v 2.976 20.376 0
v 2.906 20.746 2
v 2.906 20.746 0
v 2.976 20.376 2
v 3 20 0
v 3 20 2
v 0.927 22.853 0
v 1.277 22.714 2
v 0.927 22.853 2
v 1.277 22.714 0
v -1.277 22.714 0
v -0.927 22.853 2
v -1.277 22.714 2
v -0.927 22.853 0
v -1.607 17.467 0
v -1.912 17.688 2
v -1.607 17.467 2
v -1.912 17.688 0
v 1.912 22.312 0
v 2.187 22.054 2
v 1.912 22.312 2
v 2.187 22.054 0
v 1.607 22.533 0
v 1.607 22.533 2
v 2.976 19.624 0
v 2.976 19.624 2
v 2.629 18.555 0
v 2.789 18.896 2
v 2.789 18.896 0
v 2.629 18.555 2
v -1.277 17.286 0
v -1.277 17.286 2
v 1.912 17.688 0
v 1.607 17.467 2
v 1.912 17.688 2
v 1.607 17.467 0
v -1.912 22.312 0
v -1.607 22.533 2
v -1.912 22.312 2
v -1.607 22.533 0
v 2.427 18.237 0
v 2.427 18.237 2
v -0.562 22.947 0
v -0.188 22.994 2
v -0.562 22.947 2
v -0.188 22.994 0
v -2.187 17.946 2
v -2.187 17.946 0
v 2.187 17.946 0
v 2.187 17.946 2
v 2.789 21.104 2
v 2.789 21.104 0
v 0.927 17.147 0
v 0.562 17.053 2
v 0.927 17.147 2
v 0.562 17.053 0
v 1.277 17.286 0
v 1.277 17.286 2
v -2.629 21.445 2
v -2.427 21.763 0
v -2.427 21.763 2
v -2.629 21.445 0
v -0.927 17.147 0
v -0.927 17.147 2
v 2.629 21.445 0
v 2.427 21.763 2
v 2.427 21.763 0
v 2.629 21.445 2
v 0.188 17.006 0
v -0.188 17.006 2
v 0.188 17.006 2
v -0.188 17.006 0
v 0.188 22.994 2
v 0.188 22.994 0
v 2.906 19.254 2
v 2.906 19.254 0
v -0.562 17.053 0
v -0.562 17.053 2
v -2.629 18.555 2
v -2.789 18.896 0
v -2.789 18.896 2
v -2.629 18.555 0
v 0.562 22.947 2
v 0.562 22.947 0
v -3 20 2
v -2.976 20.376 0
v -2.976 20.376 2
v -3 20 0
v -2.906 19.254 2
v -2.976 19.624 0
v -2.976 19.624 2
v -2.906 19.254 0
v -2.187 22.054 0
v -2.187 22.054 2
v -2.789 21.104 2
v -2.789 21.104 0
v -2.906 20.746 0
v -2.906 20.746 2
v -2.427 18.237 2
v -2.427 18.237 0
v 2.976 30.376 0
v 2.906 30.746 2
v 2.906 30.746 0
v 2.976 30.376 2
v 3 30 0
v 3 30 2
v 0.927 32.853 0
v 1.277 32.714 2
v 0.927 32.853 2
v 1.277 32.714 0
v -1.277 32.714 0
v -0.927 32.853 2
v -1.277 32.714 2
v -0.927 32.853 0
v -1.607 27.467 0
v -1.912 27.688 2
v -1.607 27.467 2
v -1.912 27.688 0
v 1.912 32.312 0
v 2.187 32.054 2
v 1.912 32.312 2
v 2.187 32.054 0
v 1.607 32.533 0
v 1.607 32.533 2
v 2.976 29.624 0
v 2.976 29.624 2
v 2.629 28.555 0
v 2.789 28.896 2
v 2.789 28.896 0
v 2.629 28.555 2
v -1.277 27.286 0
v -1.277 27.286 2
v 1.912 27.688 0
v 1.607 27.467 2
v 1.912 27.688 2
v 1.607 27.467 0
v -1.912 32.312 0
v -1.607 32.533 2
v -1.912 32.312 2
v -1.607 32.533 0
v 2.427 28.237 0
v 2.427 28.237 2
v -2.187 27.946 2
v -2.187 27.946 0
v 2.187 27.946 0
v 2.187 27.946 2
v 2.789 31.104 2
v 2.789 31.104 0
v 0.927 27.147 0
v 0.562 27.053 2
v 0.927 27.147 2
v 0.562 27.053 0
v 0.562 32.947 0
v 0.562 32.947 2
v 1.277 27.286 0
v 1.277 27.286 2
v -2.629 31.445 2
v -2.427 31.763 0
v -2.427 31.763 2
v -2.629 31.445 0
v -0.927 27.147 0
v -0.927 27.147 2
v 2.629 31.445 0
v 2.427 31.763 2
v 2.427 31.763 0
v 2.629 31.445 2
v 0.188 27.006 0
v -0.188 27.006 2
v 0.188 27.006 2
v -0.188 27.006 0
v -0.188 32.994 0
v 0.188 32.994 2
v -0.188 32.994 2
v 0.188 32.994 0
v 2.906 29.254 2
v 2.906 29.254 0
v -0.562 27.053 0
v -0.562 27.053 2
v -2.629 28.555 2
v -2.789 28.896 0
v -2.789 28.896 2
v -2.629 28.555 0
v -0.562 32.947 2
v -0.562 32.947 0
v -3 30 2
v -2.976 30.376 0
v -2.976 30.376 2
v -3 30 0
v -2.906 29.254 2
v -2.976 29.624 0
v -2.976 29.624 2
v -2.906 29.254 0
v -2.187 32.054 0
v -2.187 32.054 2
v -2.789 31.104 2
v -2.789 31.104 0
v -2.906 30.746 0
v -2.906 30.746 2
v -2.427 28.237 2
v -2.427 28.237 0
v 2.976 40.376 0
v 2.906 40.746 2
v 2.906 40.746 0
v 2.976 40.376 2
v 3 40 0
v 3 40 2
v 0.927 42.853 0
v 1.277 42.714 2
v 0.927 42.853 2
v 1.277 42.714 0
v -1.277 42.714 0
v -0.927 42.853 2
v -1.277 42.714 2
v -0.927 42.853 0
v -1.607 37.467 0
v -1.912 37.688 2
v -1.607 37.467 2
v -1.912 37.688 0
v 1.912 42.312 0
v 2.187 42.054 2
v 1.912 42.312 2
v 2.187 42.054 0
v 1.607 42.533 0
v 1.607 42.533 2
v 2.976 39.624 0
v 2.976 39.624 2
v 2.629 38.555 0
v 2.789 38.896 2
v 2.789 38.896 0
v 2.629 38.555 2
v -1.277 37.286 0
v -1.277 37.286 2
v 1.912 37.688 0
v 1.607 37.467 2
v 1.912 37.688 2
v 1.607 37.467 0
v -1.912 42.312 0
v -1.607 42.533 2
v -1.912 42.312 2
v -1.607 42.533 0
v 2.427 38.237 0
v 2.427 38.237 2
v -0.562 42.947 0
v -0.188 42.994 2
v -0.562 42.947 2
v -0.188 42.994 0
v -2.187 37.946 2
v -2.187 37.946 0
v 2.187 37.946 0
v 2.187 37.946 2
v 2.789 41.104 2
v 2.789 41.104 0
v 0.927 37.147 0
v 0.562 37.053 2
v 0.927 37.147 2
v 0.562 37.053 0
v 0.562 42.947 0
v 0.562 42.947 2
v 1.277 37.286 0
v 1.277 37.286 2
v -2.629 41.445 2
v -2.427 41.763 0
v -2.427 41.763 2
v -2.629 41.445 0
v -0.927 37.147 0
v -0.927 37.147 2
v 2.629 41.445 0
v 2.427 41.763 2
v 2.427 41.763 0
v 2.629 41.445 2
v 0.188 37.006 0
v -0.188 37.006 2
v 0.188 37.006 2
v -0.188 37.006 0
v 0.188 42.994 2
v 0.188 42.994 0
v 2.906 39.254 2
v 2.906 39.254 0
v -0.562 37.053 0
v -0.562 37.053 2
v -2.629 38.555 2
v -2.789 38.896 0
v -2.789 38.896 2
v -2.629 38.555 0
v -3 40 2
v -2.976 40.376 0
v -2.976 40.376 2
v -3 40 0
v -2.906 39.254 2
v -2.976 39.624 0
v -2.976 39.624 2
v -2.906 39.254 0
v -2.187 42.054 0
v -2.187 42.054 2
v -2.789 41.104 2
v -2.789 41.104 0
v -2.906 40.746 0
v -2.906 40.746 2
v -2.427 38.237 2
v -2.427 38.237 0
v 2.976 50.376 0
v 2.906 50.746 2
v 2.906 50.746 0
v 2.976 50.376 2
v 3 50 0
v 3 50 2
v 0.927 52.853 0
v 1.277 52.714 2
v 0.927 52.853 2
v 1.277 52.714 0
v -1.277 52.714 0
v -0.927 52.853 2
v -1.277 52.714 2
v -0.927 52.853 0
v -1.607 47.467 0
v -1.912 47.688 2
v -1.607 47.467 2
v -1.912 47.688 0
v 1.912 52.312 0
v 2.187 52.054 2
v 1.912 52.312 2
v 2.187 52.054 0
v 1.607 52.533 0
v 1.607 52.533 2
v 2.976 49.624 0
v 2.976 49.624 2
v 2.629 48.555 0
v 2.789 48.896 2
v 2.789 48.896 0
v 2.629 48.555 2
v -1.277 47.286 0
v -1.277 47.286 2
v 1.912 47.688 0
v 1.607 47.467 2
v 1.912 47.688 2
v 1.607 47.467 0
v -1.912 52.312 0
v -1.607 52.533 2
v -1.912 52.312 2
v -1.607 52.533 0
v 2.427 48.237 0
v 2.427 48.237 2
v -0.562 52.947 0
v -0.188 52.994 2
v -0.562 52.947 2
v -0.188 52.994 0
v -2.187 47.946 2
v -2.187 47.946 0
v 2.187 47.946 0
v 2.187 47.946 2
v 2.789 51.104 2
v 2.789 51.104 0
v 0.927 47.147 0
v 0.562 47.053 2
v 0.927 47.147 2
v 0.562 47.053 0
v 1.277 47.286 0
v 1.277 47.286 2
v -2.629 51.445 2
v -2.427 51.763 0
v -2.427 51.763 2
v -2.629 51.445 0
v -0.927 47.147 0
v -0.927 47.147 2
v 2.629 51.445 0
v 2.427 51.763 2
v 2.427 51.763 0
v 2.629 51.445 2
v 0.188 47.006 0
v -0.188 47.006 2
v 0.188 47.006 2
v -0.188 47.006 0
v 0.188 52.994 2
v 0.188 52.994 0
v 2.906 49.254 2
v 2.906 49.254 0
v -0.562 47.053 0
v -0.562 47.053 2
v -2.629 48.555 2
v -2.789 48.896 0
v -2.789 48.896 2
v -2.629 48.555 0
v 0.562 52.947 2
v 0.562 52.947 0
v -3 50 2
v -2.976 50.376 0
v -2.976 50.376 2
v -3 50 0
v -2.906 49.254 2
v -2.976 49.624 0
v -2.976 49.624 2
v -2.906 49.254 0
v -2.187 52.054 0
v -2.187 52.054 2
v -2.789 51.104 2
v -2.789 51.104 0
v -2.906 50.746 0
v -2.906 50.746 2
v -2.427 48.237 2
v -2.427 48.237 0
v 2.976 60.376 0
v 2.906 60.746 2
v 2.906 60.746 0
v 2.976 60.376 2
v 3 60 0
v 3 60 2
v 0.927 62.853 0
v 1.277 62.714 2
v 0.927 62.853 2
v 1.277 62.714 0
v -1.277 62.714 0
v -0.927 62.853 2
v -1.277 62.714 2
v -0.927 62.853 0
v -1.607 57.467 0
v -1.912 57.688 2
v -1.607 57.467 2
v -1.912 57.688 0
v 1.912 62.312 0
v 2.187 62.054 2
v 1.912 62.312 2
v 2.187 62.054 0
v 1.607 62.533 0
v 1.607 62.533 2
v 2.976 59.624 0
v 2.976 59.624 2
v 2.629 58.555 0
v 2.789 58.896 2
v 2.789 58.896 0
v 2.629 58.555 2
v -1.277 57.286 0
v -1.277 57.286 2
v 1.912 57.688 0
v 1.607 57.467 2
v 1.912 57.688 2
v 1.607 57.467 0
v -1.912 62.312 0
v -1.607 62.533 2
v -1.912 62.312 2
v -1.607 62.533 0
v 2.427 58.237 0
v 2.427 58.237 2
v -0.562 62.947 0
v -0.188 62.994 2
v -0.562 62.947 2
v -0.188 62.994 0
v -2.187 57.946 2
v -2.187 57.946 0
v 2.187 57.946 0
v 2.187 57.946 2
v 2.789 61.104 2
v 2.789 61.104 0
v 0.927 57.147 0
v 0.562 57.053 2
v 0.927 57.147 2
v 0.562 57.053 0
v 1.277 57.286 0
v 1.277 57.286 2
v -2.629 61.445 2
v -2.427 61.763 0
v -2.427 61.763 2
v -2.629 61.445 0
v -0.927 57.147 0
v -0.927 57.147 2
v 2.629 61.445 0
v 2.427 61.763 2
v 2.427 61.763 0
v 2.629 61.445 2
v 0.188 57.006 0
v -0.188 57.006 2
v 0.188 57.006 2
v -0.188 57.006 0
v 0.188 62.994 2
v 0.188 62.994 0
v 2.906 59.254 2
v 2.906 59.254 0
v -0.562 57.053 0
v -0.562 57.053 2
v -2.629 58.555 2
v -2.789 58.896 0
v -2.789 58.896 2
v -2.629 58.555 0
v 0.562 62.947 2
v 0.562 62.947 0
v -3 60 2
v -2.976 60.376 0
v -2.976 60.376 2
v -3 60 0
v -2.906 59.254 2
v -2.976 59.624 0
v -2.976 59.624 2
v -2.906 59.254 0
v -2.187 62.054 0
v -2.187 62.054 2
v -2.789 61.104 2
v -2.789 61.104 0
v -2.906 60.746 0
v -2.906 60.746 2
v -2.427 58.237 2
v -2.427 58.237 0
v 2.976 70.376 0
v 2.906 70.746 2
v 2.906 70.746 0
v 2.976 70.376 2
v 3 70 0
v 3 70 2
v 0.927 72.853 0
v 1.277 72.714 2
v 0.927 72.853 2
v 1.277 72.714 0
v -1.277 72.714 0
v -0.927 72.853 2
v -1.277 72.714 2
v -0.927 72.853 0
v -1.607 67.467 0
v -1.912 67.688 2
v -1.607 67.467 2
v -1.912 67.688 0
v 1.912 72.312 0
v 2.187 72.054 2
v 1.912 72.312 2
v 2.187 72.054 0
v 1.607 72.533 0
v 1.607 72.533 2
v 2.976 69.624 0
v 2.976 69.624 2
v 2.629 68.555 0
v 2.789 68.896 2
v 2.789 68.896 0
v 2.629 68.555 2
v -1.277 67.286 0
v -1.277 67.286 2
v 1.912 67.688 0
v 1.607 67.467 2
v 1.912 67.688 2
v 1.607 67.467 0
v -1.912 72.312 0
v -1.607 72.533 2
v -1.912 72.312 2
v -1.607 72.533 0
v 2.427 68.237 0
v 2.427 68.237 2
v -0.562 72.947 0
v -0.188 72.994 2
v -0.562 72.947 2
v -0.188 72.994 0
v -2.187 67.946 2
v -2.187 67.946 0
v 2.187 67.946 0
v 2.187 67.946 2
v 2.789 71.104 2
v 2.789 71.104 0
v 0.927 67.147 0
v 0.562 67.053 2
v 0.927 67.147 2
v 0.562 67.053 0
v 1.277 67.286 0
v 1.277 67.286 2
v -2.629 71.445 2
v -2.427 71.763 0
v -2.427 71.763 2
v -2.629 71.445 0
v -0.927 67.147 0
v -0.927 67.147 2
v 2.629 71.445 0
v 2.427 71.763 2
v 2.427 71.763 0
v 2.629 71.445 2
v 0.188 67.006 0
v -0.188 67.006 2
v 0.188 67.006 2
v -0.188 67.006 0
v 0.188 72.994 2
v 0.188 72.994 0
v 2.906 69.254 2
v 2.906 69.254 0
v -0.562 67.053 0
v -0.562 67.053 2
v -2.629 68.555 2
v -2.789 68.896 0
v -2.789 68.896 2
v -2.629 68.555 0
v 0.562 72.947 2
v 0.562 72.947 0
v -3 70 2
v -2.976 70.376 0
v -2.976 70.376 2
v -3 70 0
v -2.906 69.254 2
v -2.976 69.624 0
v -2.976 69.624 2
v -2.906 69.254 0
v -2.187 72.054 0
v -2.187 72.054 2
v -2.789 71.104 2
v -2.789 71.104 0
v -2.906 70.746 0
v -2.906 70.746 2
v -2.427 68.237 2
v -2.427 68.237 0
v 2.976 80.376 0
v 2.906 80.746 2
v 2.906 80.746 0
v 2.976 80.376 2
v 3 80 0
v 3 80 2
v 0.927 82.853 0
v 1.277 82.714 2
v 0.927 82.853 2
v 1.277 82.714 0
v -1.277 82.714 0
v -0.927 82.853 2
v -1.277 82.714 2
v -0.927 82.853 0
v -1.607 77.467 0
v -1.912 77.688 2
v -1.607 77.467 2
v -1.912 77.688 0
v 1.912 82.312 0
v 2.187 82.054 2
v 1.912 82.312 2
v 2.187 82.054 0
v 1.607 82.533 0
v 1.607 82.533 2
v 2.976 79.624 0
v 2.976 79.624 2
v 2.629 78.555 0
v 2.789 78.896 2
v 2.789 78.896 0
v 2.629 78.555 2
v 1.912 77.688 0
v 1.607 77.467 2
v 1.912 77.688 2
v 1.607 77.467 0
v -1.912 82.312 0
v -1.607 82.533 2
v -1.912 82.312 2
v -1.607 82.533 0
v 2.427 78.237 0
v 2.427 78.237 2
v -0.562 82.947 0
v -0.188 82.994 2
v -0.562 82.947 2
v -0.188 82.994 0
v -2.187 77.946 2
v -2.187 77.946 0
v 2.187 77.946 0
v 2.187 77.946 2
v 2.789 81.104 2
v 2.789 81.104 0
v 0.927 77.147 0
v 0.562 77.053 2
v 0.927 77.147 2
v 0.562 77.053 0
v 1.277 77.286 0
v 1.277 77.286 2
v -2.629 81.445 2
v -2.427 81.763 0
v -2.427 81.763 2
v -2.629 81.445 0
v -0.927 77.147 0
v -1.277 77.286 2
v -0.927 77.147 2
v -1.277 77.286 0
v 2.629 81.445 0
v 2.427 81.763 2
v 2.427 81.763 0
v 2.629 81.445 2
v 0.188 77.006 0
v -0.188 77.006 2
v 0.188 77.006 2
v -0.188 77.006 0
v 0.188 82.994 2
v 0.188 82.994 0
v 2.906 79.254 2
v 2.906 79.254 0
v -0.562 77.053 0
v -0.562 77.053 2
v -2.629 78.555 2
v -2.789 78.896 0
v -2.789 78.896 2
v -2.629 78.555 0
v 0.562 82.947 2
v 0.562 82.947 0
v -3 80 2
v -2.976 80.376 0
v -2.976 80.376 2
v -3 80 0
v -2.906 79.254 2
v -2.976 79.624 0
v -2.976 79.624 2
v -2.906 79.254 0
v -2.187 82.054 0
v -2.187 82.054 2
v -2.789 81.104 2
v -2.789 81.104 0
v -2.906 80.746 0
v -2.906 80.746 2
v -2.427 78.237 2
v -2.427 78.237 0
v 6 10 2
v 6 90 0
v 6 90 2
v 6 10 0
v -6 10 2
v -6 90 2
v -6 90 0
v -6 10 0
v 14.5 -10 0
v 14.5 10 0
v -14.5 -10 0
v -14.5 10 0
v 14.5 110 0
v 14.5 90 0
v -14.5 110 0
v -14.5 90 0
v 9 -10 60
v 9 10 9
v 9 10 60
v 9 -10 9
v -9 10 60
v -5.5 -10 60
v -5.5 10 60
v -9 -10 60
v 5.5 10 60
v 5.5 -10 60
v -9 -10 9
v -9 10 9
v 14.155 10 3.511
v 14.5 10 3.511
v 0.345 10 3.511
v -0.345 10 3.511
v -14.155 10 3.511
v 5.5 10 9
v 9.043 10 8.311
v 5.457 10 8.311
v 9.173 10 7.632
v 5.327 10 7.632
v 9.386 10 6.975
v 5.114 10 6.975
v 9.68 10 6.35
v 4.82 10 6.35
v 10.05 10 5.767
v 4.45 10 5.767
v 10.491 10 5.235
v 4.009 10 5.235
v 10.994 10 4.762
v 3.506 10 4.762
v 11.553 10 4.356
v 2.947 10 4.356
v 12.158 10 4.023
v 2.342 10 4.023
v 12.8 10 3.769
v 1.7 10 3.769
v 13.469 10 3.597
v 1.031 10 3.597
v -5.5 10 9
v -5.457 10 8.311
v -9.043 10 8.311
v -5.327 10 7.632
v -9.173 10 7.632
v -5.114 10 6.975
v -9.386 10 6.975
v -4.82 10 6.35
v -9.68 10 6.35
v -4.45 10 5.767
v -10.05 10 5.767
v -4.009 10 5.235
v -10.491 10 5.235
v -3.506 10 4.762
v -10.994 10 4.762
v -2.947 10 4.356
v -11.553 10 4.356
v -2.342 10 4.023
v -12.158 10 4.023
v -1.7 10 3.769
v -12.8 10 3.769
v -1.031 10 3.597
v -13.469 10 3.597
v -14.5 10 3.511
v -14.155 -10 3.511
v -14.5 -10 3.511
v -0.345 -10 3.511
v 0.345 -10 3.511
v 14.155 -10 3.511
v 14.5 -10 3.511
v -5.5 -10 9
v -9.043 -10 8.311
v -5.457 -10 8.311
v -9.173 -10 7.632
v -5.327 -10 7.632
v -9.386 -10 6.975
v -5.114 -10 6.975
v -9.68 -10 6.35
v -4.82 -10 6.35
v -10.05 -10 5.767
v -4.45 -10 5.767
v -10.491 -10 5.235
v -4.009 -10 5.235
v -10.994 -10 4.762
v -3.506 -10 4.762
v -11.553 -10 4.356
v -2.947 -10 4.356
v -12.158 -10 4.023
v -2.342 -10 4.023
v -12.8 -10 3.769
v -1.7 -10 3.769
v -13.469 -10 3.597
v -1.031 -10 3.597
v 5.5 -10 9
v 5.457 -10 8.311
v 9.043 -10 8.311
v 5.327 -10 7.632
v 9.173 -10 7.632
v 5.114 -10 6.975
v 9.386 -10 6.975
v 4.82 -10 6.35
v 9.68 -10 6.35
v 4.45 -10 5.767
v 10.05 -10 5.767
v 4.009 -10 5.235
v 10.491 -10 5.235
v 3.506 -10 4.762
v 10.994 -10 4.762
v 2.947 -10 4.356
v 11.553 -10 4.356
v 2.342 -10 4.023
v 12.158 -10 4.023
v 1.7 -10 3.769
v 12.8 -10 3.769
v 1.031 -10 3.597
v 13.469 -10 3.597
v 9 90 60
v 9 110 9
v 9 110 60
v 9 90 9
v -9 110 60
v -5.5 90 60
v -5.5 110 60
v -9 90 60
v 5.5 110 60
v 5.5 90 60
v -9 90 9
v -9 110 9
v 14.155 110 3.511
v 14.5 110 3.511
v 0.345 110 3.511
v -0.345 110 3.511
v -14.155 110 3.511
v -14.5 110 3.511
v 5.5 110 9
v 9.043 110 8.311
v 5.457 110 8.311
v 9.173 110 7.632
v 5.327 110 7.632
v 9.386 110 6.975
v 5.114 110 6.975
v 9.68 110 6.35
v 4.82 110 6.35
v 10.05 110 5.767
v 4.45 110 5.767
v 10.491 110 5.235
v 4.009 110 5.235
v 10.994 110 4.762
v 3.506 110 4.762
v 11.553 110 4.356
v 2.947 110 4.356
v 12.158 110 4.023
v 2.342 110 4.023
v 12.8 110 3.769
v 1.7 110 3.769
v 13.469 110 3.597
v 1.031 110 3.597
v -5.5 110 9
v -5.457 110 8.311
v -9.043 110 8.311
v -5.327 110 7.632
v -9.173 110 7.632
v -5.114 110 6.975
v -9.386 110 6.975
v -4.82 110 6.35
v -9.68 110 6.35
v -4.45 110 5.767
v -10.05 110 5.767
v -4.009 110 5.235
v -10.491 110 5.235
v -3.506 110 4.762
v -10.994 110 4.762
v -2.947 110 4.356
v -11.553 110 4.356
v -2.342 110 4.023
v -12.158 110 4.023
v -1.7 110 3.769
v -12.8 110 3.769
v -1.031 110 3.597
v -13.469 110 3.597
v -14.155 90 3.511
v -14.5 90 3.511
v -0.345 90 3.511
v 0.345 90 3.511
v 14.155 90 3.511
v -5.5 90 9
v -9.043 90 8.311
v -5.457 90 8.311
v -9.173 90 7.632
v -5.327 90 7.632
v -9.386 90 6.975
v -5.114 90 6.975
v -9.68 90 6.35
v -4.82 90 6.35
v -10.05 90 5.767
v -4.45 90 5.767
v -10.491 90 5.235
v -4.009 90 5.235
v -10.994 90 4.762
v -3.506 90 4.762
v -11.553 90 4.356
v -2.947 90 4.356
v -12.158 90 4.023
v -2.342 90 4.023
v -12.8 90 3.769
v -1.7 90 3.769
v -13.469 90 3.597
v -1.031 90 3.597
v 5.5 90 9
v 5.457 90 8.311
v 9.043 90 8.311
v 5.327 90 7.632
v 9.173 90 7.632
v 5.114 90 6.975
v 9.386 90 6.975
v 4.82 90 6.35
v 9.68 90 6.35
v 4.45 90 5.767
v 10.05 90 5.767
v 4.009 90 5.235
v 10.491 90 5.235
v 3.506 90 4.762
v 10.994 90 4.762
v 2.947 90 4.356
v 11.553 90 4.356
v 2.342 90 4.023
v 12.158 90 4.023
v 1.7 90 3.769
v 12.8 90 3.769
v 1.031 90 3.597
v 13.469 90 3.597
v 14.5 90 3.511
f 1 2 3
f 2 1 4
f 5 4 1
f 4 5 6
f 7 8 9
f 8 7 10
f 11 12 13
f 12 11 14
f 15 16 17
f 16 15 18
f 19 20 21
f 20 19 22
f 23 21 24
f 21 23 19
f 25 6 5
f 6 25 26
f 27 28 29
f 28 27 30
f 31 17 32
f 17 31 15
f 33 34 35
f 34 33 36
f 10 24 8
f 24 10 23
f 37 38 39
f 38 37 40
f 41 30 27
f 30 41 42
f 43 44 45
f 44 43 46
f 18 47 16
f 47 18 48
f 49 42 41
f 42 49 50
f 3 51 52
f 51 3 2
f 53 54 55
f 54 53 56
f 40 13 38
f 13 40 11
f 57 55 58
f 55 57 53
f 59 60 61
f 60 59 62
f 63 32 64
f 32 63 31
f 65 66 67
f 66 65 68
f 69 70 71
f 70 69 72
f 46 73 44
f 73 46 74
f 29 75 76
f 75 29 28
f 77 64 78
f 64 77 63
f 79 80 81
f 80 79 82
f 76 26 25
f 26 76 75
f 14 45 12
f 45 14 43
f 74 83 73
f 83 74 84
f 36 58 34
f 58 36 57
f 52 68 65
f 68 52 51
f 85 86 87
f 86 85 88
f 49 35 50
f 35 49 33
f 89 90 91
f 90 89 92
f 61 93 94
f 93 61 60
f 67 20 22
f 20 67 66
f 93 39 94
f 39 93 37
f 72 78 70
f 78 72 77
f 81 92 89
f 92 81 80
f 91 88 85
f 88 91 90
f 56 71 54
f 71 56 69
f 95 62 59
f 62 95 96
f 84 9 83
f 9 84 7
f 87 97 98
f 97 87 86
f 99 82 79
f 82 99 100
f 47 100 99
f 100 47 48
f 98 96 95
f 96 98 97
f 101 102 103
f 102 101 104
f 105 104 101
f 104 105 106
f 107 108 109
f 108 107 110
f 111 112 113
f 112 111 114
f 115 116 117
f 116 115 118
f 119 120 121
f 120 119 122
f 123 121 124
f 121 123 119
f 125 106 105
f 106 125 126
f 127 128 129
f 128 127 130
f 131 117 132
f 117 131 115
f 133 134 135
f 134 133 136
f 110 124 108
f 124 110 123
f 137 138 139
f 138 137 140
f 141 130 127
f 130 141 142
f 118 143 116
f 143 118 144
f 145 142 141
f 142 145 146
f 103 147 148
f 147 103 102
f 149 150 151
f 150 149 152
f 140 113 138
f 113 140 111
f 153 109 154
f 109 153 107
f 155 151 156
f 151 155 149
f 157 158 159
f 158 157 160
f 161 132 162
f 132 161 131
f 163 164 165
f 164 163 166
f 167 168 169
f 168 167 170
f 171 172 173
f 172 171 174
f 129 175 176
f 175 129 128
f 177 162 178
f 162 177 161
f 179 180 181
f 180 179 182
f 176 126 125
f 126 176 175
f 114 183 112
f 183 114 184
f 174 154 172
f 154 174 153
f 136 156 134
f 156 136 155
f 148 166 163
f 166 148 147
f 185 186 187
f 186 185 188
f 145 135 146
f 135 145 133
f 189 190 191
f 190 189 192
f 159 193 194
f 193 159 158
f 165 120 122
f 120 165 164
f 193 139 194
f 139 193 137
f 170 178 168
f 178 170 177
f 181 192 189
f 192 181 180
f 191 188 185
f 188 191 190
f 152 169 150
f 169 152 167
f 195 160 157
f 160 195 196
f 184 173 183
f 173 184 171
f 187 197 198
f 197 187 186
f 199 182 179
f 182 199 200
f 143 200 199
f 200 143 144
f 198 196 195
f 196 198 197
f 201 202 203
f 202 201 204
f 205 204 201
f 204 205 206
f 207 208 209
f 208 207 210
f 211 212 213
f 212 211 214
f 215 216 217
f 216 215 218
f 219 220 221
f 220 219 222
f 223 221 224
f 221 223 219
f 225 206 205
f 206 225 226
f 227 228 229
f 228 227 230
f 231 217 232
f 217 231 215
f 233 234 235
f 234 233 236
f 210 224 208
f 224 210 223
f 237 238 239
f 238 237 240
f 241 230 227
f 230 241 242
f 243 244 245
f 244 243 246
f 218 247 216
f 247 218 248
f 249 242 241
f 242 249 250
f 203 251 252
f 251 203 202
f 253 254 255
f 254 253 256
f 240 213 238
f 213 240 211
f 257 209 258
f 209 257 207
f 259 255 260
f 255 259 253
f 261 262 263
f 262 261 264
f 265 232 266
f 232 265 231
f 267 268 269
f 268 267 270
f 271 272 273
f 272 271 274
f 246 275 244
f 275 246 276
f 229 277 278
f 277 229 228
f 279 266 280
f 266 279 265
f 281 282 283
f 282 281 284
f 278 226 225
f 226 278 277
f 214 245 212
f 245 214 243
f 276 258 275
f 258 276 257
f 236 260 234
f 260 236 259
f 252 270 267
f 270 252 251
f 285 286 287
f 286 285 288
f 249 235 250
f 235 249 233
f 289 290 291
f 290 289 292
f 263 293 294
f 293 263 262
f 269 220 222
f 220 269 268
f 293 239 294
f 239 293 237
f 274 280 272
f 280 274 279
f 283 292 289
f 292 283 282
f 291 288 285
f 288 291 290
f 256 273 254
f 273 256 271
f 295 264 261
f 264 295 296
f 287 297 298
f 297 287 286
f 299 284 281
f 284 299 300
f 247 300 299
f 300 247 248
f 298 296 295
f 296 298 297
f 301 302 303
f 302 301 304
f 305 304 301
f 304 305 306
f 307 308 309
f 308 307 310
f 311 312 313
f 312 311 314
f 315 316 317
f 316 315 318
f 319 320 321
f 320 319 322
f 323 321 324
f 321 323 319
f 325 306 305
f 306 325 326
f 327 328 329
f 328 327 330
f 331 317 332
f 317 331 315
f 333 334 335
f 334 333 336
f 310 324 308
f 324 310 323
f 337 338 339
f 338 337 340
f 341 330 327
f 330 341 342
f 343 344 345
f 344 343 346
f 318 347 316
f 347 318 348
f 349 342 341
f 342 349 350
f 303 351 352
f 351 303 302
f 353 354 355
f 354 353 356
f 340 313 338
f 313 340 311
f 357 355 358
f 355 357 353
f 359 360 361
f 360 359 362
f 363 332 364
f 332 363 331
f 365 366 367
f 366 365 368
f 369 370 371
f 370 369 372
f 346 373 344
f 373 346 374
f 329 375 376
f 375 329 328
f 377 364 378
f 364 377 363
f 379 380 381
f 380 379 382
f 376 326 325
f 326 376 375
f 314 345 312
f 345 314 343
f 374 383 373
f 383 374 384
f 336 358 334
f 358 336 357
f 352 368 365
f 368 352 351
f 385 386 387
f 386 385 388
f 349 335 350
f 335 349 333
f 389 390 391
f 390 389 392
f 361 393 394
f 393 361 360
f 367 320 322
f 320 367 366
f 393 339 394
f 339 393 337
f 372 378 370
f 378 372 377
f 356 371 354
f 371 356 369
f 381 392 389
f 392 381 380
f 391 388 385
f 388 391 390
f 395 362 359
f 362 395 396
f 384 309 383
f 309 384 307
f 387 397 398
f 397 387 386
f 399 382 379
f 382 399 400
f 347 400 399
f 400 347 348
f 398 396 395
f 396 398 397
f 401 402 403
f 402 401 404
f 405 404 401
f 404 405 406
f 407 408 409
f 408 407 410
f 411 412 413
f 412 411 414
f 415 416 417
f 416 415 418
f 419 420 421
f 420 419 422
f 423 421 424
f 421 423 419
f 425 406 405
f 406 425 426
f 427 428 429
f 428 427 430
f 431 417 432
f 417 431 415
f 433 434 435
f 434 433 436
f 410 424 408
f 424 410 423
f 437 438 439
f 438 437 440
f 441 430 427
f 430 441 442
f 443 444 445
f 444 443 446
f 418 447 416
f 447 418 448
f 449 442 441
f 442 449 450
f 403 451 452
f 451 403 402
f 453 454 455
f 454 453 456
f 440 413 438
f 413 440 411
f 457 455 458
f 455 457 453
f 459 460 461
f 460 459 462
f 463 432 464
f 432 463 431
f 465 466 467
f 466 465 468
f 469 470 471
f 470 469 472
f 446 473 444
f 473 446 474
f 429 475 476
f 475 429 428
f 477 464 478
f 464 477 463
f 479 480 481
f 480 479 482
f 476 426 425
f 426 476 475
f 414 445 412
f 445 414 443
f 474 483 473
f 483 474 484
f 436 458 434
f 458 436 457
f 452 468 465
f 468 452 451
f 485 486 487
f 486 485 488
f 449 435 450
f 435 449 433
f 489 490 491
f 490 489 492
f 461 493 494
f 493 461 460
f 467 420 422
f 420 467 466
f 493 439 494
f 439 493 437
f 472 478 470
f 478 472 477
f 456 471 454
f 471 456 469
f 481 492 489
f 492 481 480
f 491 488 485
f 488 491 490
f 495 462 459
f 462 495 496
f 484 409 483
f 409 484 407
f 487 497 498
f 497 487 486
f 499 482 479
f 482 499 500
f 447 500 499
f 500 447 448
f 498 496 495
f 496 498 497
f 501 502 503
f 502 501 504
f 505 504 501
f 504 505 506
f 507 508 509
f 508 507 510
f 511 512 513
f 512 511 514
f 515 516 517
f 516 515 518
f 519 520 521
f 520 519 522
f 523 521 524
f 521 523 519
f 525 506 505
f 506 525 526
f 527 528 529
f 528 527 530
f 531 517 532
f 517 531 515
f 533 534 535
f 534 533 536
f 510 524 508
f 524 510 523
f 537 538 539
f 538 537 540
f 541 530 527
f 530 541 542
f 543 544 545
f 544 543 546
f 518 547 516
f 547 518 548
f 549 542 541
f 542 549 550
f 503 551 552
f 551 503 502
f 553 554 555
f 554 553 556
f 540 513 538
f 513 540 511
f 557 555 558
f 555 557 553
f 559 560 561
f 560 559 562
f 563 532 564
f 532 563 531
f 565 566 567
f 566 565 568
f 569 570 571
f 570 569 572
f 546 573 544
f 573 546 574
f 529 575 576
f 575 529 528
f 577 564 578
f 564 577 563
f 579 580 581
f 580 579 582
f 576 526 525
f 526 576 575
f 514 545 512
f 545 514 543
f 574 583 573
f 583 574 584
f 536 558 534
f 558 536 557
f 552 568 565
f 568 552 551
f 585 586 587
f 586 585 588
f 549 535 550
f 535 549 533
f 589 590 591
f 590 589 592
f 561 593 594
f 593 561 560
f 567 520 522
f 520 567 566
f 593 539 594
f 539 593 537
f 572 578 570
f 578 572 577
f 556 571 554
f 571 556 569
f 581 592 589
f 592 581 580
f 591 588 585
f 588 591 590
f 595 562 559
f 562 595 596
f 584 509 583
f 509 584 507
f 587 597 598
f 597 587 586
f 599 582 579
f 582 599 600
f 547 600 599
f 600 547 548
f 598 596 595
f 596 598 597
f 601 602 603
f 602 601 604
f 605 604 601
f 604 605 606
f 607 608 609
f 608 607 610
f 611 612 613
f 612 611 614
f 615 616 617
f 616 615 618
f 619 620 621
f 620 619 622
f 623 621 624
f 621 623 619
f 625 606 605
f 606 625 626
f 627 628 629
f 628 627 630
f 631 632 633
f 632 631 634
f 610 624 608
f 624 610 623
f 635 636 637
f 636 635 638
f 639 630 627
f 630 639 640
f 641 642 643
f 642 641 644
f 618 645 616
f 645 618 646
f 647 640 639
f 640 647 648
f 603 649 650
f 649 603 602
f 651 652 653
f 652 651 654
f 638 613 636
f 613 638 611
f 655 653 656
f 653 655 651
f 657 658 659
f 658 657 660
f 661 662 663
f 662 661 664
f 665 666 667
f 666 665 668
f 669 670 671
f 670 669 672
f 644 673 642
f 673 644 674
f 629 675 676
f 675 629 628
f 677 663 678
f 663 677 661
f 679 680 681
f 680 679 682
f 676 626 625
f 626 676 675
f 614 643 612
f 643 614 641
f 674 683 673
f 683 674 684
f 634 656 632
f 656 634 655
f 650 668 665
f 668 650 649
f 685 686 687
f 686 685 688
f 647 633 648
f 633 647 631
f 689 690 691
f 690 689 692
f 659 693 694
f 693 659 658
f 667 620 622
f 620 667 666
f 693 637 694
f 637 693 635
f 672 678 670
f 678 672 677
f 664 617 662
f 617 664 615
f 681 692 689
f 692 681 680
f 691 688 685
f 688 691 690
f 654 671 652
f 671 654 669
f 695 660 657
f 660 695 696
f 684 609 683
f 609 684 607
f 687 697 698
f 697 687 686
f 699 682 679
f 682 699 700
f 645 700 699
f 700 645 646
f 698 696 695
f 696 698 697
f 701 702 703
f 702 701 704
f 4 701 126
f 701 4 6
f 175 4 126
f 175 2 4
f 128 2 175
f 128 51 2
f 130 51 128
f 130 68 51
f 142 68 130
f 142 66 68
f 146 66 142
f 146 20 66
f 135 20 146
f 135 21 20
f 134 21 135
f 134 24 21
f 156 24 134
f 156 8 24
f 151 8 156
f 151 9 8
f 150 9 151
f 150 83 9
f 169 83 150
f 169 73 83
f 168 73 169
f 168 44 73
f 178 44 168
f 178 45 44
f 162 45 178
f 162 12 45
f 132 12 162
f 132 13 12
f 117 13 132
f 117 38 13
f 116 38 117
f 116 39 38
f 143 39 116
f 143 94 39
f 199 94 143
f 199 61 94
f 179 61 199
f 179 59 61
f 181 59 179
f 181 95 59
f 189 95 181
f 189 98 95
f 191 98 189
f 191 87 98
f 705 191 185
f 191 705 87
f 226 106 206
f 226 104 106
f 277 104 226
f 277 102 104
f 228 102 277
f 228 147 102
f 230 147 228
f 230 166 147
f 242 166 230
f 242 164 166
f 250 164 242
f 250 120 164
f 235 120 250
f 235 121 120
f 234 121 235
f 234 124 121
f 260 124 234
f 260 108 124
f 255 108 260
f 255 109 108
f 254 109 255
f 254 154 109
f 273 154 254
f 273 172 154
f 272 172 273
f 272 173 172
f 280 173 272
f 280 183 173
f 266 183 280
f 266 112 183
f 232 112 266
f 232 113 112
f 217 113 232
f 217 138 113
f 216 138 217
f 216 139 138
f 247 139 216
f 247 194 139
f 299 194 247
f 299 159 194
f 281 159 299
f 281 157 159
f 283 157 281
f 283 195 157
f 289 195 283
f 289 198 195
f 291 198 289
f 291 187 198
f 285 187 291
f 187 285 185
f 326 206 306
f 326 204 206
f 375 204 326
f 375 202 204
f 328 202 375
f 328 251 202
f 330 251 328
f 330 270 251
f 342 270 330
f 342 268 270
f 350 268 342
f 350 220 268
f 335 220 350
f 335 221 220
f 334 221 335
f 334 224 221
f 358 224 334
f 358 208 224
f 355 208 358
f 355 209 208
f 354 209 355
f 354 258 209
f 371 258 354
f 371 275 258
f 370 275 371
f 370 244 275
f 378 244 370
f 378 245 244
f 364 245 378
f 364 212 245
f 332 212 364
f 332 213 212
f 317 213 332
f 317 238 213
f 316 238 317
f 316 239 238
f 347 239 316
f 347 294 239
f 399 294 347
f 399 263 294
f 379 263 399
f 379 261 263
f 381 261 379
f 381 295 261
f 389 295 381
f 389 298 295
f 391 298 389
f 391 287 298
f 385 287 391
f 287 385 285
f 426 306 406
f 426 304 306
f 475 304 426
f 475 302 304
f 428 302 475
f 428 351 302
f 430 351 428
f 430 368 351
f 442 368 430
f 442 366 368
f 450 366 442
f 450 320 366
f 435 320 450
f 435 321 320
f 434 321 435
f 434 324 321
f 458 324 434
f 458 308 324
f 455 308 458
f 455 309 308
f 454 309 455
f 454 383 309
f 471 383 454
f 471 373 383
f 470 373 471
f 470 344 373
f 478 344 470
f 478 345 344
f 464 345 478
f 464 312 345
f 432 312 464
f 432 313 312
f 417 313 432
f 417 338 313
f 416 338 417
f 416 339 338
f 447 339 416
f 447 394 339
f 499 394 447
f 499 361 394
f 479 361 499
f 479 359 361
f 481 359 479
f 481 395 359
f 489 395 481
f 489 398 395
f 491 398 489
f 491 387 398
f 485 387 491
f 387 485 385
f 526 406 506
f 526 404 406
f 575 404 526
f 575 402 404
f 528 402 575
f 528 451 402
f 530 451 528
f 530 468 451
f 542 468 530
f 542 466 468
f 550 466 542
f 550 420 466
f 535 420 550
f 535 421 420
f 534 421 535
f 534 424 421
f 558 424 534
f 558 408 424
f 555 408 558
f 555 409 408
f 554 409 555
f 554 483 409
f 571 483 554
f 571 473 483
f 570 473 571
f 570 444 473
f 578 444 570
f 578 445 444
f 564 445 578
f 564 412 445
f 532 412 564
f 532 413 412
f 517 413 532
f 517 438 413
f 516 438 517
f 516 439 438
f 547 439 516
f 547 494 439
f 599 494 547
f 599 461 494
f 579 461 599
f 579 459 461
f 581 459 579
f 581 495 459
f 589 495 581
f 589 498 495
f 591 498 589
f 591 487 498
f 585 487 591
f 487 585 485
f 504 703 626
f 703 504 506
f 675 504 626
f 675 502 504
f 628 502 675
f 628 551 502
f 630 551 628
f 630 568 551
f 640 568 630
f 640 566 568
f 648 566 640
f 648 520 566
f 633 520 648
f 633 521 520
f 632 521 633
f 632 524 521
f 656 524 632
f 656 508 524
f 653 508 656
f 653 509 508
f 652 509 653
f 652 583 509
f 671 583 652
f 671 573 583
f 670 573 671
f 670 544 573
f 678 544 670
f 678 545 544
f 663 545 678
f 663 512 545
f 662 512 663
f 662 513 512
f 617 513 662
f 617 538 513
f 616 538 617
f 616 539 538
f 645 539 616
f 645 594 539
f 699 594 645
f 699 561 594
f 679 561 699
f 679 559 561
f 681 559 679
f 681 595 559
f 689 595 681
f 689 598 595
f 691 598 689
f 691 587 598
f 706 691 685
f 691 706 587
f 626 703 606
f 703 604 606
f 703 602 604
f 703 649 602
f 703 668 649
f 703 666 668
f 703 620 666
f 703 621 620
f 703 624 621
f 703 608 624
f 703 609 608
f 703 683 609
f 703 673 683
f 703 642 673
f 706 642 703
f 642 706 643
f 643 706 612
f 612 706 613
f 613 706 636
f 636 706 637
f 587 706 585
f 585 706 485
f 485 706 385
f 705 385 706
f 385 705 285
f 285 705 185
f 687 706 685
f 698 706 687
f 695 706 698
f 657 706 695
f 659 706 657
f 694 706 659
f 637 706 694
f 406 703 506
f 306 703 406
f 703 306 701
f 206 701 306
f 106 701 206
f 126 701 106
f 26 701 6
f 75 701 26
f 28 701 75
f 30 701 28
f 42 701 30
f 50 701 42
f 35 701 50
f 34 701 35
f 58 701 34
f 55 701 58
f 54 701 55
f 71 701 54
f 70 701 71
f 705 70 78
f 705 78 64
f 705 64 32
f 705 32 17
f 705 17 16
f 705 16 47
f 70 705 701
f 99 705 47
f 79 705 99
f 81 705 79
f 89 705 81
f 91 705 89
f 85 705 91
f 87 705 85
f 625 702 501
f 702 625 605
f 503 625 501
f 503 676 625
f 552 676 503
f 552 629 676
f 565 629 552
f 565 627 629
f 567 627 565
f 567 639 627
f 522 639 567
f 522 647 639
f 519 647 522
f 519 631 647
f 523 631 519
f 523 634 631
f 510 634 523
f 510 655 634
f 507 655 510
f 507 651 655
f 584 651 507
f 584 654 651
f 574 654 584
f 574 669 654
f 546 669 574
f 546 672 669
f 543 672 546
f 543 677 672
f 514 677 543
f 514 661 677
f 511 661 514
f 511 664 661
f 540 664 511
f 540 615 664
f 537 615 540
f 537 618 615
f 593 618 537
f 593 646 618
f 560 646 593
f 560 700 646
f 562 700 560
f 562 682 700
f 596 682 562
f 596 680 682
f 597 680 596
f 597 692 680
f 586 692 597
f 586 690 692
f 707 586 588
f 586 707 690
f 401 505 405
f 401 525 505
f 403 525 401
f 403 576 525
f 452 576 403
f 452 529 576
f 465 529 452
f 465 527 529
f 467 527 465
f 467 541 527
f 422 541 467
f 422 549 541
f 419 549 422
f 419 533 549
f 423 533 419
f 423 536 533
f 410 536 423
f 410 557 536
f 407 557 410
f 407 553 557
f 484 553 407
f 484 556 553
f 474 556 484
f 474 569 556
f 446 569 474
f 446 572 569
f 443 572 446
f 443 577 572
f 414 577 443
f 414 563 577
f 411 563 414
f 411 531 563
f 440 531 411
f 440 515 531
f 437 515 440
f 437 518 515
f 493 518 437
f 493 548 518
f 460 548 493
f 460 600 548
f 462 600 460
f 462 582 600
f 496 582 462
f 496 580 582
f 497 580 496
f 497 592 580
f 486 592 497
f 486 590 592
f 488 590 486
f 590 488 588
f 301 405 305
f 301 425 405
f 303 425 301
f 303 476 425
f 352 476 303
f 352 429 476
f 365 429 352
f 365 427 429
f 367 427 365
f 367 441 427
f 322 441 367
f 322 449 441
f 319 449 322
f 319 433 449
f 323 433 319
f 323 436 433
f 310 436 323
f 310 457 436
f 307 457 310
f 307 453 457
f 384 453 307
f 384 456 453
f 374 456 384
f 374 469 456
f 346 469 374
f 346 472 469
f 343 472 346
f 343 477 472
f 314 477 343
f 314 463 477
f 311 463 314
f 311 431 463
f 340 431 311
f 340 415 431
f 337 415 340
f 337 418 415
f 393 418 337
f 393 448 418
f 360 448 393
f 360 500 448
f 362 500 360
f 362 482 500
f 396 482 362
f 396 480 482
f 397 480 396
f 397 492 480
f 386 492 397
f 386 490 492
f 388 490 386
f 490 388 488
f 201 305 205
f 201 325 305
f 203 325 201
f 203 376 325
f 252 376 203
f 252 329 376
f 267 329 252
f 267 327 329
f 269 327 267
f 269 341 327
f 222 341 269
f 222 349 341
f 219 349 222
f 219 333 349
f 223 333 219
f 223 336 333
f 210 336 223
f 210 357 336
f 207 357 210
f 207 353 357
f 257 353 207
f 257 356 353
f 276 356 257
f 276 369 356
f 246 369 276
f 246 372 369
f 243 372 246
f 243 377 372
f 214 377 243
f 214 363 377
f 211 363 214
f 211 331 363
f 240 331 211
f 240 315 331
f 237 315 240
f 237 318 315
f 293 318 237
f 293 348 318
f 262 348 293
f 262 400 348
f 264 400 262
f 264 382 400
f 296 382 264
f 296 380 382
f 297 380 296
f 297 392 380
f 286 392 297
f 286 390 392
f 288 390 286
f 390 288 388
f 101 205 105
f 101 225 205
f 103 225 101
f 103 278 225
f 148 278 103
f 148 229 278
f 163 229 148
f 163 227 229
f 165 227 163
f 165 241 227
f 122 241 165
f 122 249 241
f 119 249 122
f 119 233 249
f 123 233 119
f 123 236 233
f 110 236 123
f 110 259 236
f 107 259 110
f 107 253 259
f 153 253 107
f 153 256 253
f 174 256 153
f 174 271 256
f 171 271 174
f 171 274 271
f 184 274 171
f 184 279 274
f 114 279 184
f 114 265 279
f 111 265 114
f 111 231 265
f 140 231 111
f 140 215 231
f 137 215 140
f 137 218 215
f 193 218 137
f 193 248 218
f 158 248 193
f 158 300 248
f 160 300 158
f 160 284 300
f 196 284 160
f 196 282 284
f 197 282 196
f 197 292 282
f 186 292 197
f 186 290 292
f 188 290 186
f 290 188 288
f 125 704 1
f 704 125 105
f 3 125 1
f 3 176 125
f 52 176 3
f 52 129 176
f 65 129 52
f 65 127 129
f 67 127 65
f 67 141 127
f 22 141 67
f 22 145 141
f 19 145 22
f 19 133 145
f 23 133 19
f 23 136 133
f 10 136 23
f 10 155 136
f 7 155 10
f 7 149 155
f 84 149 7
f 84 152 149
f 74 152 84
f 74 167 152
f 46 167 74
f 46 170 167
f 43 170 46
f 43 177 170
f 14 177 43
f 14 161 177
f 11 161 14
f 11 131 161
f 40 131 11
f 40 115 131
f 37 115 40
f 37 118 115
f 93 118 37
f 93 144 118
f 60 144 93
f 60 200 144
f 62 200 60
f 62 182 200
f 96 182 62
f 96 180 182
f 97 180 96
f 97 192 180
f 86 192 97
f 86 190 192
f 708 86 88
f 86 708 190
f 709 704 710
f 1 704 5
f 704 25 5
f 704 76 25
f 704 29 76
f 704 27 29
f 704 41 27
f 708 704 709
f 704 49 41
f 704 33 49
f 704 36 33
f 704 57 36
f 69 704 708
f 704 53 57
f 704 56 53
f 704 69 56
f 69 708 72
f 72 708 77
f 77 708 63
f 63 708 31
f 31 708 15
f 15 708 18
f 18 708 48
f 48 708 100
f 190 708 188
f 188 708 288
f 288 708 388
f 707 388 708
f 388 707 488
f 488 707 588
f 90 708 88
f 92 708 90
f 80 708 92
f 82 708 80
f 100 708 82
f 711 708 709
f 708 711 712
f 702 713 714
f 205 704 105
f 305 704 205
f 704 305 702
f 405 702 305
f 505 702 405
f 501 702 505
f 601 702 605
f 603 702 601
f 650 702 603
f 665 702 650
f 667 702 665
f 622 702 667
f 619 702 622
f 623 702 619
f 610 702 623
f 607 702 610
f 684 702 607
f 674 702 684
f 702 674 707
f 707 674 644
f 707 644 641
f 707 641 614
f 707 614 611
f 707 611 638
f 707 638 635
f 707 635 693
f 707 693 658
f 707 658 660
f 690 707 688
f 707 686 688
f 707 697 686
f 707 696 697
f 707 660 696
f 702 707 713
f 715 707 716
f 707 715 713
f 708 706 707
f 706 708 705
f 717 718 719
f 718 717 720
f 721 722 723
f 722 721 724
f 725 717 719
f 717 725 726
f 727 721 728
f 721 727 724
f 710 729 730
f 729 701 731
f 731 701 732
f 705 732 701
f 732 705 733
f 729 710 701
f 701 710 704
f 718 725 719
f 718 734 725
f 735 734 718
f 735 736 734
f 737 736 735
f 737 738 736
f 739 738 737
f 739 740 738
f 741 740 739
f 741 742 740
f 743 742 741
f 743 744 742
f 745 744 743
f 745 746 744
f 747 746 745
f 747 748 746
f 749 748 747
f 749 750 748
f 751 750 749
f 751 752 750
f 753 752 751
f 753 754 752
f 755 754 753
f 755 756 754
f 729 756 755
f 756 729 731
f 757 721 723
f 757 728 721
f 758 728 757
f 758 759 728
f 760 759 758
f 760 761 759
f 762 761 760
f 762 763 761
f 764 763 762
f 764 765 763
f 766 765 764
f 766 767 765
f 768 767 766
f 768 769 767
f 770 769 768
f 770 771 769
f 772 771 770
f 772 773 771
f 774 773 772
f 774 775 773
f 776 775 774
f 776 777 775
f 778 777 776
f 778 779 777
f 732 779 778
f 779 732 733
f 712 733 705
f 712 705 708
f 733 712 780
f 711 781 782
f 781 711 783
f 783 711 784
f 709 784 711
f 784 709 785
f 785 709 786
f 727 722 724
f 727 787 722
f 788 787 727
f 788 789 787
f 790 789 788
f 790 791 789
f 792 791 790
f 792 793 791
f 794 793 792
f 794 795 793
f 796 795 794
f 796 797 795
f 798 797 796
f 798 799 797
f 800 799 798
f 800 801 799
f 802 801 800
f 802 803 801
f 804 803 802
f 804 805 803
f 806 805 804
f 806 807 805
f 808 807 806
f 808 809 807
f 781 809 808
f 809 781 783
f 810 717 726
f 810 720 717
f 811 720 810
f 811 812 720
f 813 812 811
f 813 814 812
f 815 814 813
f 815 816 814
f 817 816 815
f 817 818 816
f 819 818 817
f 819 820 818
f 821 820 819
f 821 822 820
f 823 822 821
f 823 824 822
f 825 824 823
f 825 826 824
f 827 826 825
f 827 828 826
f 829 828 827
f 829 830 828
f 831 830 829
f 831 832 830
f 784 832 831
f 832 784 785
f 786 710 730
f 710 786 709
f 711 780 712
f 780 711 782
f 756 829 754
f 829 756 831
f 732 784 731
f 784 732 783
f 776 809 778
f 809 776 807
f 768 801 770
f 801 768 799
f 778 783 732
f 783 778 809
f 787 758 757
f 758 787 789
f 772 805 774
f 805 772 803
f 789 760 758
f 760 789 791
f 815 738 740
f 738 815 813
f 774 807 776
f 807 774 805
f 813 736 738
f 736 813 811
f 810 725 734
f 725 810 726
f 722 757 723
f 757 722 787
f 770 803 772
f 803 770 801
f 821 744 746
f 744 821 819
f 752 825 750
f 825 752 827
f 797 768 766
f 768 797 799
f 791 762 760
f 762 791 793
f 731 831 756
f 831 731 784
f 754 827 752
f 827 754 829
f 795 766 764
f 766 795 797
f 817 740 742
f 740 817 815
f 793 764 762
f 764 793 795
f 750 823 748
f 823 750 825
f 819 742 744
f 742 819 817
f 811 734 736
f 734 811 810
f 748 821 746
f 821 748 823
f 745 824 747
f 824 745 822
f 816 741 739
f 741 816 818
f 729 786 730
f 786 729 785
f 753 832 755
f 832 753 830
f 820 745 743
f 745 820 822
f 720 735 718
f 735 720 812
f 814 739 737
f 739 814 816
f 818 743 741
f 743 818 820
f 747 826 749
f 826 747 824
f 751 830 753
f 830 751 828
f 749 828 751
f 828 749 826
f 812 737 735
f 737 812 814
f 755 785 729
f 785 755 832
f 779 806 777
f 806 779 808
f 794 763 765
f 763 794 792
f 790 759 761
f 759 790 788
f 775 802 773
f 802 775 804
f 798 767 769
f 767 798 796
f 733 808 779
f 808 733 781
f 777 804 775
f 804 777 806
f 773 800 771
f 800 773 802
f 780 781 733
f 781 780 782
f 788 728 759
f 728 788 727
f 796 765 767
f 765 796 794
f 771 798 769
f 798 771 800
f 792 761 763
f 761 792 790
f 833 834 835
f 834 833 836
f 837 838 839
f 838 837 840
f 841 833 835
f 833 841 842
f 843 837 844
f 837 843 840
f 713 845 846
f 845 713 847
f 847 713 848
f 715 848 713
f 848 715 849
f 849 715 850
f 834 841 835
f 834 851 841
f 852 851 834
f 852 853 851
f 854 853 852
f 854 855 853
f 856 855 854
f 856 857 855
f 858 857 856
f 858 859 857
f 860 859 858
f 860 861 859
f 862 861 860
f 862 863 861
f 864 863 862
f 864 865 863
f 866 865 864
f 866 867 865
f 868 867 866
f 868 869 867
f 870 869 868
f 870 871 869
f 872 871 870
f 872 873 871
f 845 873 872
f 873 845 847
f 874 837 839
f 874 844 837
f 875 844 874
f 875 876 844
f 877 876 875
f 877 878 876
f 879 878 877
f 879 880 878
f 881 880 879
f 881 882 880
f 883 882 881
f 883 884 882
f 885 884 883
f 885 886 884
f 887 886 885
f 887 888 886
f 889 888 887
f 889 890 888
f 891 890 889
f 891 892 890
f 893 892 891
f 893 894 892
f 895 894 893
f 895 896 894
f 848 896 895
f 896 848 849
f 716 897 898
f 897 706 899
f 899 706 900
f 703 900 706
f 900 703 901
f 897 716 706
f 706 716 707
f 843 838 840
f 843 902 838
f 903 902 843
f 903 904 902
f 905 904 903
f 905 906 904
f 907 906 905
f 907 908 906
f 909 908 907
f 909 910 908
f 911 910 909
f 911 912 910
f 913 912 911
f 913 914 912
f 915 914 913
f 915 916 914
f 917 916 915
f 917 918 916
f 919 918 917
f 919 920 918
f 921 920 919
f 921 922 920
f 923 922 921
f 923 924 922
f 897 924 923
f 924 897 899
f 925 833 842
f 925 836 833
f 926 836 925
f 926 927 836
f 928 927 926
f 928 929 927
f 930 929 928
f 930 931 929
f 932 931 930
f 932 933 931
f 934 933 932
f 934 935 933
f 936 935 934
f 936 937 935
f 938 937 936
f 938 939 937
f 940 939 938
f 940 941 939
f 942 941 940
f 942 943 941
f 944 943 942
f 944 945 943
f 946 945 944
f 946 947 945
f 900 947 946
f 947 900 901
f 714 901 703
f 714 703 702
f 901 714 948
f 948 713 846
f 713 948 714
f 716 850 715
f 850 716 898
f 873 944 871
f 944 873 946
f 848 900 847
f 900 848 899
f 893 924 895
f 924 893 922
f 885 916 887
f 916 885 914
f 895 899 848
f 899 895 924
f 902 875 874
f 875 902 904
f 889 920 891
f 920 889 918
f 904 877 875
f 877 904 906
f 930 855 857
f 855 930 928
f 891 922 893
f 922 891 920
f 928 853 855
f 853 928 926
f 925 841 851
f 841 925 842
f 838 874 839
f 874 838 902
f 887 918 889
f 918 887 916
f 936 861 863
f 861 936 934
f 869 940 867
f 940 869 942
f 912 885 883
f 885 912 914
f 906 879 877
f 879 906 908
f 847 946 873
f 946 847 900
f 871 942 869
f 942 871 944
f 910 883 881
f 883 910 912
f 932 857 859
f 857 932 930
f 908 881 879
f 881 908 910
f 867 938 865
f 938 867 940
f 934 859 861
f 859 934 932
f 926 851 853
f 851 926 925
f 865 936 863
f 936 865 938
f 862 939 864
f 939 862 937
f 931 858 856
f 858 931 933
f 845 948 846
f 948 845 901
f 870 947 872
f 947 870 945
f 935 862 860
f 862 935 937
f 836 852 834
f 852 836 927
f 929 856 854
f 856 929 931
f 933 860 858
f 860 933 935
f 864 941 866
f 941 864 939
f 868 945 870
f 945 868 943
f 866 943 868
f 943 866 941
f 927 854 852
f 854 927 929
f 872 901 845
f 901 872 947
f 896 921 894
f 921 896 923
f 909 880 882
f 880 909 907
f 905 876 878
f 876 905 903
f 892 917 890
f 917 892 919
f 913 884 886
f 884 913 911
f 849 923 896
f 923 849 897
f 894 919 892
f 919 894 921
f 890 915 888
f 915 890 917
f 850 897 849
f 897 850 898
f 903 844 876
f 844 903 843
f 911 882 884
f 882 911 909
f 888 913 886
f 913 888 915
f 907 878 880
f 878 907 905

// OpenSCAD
$fn=50;

cutout_r = 5.5; 
    
module end(i) { 
    translate([0,100*i,0])
    difference() { 
        union() { 
            translate([-9,-10,0]) cube([18, 20, 60]);
            translate([9,-10,0]) cube([cutout_r, 20, 9]); 
            translate([-9-cutout_r,-10,0]) cube([cutout_r, 20, 9]);
        }
        
        #translate([0,0,9])
        hull() {
            rotate([90,0,0]) cylinder(55, cutout_r, cutout_r, center=true); 
            translate([0,0,60]) rotate([90,0,0])  cylinder(50, cutout_r, cutout_r, center=true); 
        }
        
        #translate([9+cutout_r,0,9])
        hull() {
            rotate([90,0,0]) cylinder(55, cutout_r, cutout_r, center=true); 
            translate([0,0,60]) rotate([90,0,0])  cylinder(50, cutout_r, cutout_r, center=true); 
        }
        
        #translate([-9-cutout_r,0,9])
        hull() {
            rotate([90,0,0]) cylinder(55, cutout_r, cutout_r, center=true); 
            translate([0,0,60]) rotate([90,0,0])  cylinder(50, cutout_r, cutout_r, center=true); 
        }
    }
   
}

module bridge() { 
    difference() {
        translate([-6,0,0]) cube([12,100,2]);
        
        for(i = [0:1:6]) { 
            translate([0, 20 + 10*i, -10]) cylinder(30, 3, 3);
        }
    }
}

bridge(); 

for(i = [0:1:1]) { 
    end(i); 
}
